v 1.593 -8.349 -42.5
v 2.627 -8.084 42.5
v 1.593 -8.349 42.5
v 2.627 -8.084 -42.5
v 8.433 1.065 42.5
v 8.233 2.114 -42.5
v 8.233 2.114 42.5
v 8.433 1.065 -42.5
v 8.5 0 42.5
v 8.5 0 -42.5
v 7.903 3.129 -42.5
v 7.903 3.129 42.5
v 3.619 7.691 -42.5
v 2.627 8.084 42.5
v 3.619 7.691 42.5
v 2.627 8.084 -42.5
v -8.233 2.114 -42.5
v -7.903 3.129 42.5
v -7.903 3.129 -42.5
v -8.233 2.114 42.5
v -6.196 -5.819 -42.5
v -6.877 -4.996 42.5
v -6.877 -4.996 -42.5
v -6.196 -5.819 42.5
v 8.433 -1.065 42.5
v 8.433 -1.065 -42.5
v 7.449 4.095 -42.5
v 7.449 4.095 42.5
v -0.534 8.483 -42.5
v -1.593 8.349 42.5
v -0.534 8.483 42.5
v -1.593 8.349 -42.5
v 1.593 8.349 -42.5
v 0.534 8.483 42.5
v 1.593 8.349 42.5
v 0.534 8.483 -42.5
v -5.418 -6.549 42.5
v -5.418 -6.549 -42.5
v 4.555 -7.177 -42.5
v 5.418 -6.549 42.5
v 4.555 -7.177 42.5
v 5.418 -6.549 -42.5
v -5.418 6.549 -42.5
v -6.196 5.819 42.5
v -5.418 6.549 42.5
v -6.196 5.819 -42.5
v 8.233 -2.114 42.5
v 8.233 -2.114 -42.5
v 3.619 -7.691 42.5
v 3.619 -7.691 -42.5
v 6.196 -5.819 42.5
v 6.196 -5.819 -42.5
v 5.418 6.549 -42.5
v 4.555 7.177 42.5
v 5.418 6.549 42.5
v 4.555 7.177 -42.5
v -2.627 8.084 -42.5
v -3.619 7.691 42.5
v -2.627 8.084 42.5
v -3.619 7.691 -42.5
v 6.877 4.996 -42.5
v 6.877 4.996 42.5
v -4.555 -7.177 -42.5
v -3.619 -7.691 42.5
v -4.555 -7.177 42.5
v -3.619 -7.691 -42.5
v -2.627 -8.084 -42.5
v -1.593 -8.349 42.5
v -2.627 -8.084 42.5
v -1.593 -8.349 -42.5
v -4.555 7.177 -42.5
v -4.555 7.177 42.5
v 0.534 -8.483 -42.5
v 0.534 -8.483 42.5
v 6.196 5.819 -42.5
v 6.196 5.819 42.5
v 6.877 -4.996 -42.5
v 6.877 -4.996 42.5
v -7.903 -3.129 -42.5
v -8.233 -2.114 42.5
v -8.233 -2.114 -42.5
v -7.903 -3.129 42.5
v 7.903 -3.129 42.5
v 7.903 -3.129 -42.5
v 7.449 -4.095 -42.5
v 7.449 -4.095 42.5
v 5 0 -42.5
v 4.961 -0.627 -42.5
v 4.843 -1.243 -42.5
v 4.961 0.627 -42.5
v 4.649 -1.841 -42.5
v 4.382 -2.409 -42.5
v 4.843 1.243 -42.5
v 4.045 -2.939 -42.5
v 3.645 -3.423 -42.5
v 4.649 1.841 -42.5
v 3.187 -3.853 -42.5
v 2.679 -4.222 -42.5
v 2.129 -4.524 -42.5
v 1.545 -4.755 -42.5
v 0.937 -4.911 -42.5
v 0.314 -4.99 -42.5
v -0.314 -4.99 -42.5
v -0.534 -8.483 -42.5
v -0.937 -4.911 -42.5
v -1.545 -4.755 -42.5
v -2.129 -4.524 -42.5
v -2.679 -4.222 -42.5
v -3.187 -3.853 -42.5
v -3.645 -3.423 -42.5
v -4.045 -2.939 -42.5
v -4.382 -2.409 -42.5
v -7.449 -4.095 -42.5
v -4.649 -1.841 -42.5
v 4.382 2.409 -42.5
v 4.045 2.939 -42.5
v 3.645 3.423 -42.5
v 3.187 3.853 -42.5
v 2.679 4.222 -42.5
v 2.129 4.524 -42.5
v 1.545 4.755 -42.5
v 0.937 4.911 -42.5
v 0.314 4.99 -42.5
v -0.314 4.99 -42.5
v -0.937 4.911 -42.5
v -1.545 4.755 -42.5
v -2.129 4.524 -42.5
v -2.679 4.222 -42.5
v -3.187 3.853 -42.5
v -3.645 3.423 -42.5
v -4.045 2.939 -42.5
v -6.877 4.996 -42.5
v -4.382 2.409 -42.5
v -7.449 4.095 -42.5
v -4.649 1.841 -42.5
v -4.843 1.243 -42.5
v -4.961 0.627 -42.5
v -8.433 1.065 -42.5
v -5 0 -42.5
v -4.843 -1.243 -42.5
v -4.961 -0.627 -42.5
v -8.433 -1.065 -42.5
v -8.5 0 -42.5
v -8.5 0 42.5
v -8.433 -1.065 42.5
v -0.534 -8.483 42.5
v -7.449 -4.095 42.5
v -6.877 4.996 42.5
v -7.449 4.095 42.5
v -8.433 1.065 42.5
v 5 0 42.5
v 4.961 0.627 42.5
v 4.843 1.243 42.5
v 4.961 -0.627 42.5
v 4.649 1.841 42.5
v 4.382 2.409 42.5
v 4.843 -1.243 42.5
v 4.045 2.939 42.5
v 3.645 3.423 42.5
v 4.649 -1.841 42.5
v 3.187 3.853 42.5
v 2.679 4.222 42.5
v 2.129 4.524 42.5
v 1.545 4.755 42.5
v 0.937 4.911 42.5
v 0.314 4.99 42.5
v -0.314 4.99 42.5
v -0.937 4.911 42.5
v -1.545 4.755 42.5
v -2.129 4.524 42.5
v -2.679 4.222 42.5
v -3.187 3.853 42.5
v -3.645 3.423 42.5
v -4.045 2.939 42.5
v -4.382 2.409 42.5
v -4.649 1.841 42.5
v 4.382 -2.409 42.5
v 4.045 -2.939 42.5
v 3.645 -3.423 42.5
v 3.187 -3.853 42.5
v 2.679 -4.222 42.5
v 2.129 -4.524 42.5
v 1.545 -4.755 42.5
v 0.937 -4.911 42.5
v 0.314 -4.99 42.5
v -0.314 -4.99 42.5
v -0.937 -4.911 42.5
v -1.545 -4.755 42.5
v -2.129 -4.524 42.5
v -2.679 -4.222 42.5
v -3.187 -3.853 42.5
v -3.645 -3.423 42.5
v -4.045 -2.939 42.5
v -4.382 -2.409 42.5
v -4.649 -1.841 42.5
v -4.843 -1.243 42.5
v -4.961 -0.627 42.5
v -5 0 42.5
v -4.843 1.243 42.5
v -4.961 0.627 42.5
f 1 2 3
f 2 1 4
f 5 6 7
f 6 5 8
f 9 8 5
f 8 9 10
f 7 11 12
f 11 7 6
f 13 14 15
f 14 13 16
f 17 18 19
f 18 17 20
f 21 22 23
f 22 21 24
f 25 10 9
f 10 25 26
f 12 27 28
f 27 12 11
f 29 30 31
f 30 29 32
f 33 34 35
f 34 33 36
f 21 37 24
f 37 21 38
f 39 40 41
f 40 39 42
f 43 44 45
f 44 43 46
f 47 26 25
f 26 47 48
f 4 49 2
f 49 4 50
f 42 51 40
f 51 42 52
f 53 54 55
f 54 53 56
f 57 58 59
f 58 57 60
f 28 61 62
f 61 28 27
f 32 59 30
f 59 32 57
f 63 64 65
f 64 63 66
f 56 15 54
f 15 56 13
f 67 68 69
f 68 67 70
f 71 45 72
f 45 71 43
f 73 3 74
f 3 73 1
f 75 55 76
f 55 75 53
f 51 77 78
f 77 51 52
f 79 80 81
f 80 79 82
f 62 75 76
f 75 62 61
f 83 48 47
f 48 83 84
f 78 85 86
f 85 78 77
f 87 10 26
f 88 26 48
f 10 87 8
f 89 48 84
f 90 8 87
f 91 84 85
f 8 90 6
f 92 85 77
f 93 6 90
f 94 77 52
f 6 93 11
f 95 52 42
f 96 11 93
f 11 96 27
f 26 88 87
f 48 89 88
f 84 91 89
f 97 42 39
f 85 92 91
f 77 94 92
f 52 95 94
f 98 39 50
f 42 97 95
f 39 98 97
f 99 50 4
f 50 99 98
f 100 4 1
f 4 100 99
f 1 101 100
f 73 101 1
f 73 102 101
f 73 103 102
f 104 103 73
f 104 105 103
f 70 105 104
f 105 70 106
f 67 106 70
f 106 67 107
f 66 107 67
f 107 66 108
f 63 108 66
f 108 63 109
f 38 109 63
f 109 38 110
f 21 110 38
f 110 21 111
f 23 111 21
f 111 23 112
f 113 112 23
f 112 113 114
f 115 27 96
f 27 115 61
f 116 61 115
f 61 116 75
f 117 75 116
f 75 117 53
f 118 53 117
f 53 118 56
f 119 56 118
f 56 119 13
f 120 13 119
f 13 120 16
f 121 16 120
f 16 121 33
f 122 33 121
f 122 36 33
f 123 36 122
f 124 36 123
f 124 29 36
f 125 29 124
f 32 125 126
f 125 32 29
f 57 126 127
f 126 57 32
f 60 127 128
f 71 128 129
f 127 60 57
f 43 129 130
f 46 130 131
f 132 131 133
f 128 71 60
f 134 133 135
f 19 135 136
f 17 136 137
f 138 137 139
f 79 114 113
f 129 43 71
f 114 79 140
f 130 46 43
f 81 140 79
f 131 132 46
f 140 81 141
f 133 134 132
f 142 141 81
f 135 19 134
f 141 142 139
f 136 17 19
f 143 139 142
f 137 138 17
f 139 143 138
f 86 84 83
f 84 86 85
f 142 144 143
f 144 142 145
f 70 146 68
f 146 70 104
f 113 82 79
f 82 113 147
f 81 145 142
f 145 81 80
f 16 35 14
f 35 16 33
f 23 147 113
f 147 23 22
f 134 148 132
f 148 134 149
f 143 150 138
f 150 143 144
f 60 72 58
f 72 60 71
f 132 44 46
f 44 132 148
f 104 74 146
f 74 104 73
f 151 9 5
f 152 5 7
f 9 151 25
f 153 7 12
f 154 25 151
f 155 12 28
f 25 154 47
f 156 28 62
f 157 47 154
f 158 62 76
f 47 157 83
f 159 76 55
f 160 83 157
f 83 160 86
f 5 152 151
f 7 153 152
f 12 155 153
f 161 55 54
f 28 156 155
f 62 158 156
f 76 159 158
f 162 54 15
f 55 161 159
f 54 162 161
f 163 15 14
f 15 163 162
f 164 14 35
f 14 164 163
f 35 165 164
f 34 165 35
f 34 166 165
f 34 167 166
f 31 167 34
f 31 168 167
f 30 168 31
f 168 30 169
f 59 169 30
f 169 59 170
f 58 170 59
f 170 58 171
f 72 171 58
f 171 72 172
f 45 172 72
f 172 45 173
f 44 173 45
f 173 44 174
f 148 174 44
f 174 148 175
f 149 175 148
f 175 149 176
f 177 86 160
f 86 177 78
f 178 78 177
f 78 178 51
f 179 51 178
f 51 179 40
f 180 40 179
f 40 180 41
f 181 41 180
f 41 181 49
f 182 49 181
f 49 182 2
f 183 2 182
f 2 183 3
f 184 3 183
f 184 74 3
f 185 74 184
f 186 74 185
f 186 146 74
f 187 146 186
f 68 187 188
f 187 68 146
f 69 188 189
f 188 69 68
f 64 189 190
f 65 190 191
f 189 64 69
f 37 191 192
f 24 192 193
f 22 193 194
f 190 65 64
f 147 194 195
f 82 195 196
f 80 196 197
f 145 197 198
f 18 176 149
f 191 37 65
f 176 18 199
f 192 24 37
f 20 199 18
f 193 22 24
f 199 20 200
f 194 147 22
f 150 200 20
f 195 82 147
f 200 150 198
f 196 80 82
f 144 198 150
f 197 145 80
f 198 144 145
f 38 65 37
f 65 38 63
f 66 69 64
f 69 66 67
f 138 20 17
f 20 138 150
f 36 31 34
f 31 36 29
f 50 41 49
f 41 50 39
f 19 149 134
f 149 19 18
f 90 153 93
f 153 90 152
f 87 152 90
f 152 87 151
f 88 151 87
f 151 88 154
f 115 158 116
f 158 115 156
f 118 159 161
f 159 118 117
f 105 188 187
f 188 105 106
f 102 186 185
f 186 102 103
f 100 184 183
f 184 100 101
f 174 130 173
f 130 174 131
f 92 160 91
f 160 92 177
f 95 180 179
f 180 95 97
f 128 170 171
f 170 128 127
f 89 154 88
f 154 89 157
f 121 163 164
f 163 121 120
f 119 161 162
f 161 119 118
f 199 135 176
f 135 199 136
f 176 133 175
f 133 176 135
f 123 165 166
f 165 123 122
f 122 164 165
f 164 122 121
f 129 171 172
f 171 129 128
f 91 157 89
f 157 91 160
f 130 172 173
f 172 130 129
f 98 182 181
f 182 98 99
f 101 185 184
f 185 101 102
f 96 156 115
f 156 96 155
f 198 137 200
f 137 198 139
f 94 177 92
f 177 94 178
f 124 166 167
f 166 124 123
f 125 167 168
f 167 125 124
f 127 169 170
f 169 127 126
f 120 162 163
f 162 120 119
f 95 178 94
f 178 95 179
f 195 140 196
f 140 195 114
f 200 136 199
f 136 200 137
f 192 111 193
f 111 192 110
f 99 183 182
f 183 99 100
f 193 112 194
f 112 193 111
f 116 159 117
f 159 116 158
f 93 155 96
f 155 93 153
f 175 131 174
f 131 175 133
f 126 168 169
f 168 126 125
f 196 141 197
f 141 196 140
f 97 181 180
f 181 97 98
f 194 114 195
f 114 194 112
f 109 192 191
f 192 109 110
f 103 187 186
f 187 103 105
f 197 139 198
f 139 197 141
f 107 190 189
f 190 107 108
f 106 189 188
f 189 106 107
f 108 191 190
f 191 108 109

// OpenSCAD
$fn = 50;


difference() {
	union() {
		translate(v = [0, 0, -42.5000000000]) {
			cylinder(h = 85, r = 8.5000000000);
		}
	}
	union() {
		translate(v = [0, 0, -100.0000000000]) {
			cylinder(h = 200, r = 5.0000000000);
		}
	}
}
